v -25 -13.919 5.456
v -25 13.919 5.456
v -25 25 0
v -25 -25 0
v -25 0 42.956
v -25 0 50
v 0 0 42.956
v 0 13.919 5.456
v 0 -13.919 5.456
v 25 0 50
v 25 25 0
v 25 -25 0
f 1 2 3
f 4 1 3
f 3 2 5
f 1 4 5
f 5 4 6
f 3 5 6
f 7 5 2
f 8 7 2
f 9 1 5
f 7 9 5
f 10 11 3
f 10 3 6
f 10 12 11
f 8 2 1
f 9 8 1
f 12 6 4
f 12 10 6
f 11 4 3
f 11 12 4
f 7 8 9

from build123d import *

# Parameters (mm, degrees)
F1_DEPTH = 25
F2_DEPTH = 25
F4_DEPTH = 25


# Not quite as in the source:
# - a feature of the source that left no trace in its solid (it failed there, or was rolled back) is left out


with BuildPart() as f1:
    # F0 (on Right) → F1 (new body)
    with BuildSketch(Plane.YZ):
        Polygon((-25, 0), (0, 0), (0, 50), align=None)
        Polygon((0, 50), (0, 0), (25, 0), align=None)
    extrude(amount=F1_DEPTH)

    # F2 (add): a face of the model
    f2_faces = [f1.faces().sort_by_distance(p)[0] for p in [
        (0, 0, 16.6666666667),
    ]]
    extrude(f2_faces, amount=F2_DEPTH)

    # F3 (on face) → F4 (cut)
    with BuildSketch(Plane(origin=(-25, 0, 0), x_dir=(0, -1, 0), z_dir=(-1, 0, 0))):
        Polygon((-13.9194109071, 5.4563577287), (0, 5.4563577287), (0, 42.9563577287), align=None)
        Polygon((0, 42.9563577287), (0, 5.4563577287), (13.9194109071, 5.4563577287), align=None)
    extrude(amount=-F4_DEPTH, mode=Mode.SUBTRACT)


solid = f1.part
